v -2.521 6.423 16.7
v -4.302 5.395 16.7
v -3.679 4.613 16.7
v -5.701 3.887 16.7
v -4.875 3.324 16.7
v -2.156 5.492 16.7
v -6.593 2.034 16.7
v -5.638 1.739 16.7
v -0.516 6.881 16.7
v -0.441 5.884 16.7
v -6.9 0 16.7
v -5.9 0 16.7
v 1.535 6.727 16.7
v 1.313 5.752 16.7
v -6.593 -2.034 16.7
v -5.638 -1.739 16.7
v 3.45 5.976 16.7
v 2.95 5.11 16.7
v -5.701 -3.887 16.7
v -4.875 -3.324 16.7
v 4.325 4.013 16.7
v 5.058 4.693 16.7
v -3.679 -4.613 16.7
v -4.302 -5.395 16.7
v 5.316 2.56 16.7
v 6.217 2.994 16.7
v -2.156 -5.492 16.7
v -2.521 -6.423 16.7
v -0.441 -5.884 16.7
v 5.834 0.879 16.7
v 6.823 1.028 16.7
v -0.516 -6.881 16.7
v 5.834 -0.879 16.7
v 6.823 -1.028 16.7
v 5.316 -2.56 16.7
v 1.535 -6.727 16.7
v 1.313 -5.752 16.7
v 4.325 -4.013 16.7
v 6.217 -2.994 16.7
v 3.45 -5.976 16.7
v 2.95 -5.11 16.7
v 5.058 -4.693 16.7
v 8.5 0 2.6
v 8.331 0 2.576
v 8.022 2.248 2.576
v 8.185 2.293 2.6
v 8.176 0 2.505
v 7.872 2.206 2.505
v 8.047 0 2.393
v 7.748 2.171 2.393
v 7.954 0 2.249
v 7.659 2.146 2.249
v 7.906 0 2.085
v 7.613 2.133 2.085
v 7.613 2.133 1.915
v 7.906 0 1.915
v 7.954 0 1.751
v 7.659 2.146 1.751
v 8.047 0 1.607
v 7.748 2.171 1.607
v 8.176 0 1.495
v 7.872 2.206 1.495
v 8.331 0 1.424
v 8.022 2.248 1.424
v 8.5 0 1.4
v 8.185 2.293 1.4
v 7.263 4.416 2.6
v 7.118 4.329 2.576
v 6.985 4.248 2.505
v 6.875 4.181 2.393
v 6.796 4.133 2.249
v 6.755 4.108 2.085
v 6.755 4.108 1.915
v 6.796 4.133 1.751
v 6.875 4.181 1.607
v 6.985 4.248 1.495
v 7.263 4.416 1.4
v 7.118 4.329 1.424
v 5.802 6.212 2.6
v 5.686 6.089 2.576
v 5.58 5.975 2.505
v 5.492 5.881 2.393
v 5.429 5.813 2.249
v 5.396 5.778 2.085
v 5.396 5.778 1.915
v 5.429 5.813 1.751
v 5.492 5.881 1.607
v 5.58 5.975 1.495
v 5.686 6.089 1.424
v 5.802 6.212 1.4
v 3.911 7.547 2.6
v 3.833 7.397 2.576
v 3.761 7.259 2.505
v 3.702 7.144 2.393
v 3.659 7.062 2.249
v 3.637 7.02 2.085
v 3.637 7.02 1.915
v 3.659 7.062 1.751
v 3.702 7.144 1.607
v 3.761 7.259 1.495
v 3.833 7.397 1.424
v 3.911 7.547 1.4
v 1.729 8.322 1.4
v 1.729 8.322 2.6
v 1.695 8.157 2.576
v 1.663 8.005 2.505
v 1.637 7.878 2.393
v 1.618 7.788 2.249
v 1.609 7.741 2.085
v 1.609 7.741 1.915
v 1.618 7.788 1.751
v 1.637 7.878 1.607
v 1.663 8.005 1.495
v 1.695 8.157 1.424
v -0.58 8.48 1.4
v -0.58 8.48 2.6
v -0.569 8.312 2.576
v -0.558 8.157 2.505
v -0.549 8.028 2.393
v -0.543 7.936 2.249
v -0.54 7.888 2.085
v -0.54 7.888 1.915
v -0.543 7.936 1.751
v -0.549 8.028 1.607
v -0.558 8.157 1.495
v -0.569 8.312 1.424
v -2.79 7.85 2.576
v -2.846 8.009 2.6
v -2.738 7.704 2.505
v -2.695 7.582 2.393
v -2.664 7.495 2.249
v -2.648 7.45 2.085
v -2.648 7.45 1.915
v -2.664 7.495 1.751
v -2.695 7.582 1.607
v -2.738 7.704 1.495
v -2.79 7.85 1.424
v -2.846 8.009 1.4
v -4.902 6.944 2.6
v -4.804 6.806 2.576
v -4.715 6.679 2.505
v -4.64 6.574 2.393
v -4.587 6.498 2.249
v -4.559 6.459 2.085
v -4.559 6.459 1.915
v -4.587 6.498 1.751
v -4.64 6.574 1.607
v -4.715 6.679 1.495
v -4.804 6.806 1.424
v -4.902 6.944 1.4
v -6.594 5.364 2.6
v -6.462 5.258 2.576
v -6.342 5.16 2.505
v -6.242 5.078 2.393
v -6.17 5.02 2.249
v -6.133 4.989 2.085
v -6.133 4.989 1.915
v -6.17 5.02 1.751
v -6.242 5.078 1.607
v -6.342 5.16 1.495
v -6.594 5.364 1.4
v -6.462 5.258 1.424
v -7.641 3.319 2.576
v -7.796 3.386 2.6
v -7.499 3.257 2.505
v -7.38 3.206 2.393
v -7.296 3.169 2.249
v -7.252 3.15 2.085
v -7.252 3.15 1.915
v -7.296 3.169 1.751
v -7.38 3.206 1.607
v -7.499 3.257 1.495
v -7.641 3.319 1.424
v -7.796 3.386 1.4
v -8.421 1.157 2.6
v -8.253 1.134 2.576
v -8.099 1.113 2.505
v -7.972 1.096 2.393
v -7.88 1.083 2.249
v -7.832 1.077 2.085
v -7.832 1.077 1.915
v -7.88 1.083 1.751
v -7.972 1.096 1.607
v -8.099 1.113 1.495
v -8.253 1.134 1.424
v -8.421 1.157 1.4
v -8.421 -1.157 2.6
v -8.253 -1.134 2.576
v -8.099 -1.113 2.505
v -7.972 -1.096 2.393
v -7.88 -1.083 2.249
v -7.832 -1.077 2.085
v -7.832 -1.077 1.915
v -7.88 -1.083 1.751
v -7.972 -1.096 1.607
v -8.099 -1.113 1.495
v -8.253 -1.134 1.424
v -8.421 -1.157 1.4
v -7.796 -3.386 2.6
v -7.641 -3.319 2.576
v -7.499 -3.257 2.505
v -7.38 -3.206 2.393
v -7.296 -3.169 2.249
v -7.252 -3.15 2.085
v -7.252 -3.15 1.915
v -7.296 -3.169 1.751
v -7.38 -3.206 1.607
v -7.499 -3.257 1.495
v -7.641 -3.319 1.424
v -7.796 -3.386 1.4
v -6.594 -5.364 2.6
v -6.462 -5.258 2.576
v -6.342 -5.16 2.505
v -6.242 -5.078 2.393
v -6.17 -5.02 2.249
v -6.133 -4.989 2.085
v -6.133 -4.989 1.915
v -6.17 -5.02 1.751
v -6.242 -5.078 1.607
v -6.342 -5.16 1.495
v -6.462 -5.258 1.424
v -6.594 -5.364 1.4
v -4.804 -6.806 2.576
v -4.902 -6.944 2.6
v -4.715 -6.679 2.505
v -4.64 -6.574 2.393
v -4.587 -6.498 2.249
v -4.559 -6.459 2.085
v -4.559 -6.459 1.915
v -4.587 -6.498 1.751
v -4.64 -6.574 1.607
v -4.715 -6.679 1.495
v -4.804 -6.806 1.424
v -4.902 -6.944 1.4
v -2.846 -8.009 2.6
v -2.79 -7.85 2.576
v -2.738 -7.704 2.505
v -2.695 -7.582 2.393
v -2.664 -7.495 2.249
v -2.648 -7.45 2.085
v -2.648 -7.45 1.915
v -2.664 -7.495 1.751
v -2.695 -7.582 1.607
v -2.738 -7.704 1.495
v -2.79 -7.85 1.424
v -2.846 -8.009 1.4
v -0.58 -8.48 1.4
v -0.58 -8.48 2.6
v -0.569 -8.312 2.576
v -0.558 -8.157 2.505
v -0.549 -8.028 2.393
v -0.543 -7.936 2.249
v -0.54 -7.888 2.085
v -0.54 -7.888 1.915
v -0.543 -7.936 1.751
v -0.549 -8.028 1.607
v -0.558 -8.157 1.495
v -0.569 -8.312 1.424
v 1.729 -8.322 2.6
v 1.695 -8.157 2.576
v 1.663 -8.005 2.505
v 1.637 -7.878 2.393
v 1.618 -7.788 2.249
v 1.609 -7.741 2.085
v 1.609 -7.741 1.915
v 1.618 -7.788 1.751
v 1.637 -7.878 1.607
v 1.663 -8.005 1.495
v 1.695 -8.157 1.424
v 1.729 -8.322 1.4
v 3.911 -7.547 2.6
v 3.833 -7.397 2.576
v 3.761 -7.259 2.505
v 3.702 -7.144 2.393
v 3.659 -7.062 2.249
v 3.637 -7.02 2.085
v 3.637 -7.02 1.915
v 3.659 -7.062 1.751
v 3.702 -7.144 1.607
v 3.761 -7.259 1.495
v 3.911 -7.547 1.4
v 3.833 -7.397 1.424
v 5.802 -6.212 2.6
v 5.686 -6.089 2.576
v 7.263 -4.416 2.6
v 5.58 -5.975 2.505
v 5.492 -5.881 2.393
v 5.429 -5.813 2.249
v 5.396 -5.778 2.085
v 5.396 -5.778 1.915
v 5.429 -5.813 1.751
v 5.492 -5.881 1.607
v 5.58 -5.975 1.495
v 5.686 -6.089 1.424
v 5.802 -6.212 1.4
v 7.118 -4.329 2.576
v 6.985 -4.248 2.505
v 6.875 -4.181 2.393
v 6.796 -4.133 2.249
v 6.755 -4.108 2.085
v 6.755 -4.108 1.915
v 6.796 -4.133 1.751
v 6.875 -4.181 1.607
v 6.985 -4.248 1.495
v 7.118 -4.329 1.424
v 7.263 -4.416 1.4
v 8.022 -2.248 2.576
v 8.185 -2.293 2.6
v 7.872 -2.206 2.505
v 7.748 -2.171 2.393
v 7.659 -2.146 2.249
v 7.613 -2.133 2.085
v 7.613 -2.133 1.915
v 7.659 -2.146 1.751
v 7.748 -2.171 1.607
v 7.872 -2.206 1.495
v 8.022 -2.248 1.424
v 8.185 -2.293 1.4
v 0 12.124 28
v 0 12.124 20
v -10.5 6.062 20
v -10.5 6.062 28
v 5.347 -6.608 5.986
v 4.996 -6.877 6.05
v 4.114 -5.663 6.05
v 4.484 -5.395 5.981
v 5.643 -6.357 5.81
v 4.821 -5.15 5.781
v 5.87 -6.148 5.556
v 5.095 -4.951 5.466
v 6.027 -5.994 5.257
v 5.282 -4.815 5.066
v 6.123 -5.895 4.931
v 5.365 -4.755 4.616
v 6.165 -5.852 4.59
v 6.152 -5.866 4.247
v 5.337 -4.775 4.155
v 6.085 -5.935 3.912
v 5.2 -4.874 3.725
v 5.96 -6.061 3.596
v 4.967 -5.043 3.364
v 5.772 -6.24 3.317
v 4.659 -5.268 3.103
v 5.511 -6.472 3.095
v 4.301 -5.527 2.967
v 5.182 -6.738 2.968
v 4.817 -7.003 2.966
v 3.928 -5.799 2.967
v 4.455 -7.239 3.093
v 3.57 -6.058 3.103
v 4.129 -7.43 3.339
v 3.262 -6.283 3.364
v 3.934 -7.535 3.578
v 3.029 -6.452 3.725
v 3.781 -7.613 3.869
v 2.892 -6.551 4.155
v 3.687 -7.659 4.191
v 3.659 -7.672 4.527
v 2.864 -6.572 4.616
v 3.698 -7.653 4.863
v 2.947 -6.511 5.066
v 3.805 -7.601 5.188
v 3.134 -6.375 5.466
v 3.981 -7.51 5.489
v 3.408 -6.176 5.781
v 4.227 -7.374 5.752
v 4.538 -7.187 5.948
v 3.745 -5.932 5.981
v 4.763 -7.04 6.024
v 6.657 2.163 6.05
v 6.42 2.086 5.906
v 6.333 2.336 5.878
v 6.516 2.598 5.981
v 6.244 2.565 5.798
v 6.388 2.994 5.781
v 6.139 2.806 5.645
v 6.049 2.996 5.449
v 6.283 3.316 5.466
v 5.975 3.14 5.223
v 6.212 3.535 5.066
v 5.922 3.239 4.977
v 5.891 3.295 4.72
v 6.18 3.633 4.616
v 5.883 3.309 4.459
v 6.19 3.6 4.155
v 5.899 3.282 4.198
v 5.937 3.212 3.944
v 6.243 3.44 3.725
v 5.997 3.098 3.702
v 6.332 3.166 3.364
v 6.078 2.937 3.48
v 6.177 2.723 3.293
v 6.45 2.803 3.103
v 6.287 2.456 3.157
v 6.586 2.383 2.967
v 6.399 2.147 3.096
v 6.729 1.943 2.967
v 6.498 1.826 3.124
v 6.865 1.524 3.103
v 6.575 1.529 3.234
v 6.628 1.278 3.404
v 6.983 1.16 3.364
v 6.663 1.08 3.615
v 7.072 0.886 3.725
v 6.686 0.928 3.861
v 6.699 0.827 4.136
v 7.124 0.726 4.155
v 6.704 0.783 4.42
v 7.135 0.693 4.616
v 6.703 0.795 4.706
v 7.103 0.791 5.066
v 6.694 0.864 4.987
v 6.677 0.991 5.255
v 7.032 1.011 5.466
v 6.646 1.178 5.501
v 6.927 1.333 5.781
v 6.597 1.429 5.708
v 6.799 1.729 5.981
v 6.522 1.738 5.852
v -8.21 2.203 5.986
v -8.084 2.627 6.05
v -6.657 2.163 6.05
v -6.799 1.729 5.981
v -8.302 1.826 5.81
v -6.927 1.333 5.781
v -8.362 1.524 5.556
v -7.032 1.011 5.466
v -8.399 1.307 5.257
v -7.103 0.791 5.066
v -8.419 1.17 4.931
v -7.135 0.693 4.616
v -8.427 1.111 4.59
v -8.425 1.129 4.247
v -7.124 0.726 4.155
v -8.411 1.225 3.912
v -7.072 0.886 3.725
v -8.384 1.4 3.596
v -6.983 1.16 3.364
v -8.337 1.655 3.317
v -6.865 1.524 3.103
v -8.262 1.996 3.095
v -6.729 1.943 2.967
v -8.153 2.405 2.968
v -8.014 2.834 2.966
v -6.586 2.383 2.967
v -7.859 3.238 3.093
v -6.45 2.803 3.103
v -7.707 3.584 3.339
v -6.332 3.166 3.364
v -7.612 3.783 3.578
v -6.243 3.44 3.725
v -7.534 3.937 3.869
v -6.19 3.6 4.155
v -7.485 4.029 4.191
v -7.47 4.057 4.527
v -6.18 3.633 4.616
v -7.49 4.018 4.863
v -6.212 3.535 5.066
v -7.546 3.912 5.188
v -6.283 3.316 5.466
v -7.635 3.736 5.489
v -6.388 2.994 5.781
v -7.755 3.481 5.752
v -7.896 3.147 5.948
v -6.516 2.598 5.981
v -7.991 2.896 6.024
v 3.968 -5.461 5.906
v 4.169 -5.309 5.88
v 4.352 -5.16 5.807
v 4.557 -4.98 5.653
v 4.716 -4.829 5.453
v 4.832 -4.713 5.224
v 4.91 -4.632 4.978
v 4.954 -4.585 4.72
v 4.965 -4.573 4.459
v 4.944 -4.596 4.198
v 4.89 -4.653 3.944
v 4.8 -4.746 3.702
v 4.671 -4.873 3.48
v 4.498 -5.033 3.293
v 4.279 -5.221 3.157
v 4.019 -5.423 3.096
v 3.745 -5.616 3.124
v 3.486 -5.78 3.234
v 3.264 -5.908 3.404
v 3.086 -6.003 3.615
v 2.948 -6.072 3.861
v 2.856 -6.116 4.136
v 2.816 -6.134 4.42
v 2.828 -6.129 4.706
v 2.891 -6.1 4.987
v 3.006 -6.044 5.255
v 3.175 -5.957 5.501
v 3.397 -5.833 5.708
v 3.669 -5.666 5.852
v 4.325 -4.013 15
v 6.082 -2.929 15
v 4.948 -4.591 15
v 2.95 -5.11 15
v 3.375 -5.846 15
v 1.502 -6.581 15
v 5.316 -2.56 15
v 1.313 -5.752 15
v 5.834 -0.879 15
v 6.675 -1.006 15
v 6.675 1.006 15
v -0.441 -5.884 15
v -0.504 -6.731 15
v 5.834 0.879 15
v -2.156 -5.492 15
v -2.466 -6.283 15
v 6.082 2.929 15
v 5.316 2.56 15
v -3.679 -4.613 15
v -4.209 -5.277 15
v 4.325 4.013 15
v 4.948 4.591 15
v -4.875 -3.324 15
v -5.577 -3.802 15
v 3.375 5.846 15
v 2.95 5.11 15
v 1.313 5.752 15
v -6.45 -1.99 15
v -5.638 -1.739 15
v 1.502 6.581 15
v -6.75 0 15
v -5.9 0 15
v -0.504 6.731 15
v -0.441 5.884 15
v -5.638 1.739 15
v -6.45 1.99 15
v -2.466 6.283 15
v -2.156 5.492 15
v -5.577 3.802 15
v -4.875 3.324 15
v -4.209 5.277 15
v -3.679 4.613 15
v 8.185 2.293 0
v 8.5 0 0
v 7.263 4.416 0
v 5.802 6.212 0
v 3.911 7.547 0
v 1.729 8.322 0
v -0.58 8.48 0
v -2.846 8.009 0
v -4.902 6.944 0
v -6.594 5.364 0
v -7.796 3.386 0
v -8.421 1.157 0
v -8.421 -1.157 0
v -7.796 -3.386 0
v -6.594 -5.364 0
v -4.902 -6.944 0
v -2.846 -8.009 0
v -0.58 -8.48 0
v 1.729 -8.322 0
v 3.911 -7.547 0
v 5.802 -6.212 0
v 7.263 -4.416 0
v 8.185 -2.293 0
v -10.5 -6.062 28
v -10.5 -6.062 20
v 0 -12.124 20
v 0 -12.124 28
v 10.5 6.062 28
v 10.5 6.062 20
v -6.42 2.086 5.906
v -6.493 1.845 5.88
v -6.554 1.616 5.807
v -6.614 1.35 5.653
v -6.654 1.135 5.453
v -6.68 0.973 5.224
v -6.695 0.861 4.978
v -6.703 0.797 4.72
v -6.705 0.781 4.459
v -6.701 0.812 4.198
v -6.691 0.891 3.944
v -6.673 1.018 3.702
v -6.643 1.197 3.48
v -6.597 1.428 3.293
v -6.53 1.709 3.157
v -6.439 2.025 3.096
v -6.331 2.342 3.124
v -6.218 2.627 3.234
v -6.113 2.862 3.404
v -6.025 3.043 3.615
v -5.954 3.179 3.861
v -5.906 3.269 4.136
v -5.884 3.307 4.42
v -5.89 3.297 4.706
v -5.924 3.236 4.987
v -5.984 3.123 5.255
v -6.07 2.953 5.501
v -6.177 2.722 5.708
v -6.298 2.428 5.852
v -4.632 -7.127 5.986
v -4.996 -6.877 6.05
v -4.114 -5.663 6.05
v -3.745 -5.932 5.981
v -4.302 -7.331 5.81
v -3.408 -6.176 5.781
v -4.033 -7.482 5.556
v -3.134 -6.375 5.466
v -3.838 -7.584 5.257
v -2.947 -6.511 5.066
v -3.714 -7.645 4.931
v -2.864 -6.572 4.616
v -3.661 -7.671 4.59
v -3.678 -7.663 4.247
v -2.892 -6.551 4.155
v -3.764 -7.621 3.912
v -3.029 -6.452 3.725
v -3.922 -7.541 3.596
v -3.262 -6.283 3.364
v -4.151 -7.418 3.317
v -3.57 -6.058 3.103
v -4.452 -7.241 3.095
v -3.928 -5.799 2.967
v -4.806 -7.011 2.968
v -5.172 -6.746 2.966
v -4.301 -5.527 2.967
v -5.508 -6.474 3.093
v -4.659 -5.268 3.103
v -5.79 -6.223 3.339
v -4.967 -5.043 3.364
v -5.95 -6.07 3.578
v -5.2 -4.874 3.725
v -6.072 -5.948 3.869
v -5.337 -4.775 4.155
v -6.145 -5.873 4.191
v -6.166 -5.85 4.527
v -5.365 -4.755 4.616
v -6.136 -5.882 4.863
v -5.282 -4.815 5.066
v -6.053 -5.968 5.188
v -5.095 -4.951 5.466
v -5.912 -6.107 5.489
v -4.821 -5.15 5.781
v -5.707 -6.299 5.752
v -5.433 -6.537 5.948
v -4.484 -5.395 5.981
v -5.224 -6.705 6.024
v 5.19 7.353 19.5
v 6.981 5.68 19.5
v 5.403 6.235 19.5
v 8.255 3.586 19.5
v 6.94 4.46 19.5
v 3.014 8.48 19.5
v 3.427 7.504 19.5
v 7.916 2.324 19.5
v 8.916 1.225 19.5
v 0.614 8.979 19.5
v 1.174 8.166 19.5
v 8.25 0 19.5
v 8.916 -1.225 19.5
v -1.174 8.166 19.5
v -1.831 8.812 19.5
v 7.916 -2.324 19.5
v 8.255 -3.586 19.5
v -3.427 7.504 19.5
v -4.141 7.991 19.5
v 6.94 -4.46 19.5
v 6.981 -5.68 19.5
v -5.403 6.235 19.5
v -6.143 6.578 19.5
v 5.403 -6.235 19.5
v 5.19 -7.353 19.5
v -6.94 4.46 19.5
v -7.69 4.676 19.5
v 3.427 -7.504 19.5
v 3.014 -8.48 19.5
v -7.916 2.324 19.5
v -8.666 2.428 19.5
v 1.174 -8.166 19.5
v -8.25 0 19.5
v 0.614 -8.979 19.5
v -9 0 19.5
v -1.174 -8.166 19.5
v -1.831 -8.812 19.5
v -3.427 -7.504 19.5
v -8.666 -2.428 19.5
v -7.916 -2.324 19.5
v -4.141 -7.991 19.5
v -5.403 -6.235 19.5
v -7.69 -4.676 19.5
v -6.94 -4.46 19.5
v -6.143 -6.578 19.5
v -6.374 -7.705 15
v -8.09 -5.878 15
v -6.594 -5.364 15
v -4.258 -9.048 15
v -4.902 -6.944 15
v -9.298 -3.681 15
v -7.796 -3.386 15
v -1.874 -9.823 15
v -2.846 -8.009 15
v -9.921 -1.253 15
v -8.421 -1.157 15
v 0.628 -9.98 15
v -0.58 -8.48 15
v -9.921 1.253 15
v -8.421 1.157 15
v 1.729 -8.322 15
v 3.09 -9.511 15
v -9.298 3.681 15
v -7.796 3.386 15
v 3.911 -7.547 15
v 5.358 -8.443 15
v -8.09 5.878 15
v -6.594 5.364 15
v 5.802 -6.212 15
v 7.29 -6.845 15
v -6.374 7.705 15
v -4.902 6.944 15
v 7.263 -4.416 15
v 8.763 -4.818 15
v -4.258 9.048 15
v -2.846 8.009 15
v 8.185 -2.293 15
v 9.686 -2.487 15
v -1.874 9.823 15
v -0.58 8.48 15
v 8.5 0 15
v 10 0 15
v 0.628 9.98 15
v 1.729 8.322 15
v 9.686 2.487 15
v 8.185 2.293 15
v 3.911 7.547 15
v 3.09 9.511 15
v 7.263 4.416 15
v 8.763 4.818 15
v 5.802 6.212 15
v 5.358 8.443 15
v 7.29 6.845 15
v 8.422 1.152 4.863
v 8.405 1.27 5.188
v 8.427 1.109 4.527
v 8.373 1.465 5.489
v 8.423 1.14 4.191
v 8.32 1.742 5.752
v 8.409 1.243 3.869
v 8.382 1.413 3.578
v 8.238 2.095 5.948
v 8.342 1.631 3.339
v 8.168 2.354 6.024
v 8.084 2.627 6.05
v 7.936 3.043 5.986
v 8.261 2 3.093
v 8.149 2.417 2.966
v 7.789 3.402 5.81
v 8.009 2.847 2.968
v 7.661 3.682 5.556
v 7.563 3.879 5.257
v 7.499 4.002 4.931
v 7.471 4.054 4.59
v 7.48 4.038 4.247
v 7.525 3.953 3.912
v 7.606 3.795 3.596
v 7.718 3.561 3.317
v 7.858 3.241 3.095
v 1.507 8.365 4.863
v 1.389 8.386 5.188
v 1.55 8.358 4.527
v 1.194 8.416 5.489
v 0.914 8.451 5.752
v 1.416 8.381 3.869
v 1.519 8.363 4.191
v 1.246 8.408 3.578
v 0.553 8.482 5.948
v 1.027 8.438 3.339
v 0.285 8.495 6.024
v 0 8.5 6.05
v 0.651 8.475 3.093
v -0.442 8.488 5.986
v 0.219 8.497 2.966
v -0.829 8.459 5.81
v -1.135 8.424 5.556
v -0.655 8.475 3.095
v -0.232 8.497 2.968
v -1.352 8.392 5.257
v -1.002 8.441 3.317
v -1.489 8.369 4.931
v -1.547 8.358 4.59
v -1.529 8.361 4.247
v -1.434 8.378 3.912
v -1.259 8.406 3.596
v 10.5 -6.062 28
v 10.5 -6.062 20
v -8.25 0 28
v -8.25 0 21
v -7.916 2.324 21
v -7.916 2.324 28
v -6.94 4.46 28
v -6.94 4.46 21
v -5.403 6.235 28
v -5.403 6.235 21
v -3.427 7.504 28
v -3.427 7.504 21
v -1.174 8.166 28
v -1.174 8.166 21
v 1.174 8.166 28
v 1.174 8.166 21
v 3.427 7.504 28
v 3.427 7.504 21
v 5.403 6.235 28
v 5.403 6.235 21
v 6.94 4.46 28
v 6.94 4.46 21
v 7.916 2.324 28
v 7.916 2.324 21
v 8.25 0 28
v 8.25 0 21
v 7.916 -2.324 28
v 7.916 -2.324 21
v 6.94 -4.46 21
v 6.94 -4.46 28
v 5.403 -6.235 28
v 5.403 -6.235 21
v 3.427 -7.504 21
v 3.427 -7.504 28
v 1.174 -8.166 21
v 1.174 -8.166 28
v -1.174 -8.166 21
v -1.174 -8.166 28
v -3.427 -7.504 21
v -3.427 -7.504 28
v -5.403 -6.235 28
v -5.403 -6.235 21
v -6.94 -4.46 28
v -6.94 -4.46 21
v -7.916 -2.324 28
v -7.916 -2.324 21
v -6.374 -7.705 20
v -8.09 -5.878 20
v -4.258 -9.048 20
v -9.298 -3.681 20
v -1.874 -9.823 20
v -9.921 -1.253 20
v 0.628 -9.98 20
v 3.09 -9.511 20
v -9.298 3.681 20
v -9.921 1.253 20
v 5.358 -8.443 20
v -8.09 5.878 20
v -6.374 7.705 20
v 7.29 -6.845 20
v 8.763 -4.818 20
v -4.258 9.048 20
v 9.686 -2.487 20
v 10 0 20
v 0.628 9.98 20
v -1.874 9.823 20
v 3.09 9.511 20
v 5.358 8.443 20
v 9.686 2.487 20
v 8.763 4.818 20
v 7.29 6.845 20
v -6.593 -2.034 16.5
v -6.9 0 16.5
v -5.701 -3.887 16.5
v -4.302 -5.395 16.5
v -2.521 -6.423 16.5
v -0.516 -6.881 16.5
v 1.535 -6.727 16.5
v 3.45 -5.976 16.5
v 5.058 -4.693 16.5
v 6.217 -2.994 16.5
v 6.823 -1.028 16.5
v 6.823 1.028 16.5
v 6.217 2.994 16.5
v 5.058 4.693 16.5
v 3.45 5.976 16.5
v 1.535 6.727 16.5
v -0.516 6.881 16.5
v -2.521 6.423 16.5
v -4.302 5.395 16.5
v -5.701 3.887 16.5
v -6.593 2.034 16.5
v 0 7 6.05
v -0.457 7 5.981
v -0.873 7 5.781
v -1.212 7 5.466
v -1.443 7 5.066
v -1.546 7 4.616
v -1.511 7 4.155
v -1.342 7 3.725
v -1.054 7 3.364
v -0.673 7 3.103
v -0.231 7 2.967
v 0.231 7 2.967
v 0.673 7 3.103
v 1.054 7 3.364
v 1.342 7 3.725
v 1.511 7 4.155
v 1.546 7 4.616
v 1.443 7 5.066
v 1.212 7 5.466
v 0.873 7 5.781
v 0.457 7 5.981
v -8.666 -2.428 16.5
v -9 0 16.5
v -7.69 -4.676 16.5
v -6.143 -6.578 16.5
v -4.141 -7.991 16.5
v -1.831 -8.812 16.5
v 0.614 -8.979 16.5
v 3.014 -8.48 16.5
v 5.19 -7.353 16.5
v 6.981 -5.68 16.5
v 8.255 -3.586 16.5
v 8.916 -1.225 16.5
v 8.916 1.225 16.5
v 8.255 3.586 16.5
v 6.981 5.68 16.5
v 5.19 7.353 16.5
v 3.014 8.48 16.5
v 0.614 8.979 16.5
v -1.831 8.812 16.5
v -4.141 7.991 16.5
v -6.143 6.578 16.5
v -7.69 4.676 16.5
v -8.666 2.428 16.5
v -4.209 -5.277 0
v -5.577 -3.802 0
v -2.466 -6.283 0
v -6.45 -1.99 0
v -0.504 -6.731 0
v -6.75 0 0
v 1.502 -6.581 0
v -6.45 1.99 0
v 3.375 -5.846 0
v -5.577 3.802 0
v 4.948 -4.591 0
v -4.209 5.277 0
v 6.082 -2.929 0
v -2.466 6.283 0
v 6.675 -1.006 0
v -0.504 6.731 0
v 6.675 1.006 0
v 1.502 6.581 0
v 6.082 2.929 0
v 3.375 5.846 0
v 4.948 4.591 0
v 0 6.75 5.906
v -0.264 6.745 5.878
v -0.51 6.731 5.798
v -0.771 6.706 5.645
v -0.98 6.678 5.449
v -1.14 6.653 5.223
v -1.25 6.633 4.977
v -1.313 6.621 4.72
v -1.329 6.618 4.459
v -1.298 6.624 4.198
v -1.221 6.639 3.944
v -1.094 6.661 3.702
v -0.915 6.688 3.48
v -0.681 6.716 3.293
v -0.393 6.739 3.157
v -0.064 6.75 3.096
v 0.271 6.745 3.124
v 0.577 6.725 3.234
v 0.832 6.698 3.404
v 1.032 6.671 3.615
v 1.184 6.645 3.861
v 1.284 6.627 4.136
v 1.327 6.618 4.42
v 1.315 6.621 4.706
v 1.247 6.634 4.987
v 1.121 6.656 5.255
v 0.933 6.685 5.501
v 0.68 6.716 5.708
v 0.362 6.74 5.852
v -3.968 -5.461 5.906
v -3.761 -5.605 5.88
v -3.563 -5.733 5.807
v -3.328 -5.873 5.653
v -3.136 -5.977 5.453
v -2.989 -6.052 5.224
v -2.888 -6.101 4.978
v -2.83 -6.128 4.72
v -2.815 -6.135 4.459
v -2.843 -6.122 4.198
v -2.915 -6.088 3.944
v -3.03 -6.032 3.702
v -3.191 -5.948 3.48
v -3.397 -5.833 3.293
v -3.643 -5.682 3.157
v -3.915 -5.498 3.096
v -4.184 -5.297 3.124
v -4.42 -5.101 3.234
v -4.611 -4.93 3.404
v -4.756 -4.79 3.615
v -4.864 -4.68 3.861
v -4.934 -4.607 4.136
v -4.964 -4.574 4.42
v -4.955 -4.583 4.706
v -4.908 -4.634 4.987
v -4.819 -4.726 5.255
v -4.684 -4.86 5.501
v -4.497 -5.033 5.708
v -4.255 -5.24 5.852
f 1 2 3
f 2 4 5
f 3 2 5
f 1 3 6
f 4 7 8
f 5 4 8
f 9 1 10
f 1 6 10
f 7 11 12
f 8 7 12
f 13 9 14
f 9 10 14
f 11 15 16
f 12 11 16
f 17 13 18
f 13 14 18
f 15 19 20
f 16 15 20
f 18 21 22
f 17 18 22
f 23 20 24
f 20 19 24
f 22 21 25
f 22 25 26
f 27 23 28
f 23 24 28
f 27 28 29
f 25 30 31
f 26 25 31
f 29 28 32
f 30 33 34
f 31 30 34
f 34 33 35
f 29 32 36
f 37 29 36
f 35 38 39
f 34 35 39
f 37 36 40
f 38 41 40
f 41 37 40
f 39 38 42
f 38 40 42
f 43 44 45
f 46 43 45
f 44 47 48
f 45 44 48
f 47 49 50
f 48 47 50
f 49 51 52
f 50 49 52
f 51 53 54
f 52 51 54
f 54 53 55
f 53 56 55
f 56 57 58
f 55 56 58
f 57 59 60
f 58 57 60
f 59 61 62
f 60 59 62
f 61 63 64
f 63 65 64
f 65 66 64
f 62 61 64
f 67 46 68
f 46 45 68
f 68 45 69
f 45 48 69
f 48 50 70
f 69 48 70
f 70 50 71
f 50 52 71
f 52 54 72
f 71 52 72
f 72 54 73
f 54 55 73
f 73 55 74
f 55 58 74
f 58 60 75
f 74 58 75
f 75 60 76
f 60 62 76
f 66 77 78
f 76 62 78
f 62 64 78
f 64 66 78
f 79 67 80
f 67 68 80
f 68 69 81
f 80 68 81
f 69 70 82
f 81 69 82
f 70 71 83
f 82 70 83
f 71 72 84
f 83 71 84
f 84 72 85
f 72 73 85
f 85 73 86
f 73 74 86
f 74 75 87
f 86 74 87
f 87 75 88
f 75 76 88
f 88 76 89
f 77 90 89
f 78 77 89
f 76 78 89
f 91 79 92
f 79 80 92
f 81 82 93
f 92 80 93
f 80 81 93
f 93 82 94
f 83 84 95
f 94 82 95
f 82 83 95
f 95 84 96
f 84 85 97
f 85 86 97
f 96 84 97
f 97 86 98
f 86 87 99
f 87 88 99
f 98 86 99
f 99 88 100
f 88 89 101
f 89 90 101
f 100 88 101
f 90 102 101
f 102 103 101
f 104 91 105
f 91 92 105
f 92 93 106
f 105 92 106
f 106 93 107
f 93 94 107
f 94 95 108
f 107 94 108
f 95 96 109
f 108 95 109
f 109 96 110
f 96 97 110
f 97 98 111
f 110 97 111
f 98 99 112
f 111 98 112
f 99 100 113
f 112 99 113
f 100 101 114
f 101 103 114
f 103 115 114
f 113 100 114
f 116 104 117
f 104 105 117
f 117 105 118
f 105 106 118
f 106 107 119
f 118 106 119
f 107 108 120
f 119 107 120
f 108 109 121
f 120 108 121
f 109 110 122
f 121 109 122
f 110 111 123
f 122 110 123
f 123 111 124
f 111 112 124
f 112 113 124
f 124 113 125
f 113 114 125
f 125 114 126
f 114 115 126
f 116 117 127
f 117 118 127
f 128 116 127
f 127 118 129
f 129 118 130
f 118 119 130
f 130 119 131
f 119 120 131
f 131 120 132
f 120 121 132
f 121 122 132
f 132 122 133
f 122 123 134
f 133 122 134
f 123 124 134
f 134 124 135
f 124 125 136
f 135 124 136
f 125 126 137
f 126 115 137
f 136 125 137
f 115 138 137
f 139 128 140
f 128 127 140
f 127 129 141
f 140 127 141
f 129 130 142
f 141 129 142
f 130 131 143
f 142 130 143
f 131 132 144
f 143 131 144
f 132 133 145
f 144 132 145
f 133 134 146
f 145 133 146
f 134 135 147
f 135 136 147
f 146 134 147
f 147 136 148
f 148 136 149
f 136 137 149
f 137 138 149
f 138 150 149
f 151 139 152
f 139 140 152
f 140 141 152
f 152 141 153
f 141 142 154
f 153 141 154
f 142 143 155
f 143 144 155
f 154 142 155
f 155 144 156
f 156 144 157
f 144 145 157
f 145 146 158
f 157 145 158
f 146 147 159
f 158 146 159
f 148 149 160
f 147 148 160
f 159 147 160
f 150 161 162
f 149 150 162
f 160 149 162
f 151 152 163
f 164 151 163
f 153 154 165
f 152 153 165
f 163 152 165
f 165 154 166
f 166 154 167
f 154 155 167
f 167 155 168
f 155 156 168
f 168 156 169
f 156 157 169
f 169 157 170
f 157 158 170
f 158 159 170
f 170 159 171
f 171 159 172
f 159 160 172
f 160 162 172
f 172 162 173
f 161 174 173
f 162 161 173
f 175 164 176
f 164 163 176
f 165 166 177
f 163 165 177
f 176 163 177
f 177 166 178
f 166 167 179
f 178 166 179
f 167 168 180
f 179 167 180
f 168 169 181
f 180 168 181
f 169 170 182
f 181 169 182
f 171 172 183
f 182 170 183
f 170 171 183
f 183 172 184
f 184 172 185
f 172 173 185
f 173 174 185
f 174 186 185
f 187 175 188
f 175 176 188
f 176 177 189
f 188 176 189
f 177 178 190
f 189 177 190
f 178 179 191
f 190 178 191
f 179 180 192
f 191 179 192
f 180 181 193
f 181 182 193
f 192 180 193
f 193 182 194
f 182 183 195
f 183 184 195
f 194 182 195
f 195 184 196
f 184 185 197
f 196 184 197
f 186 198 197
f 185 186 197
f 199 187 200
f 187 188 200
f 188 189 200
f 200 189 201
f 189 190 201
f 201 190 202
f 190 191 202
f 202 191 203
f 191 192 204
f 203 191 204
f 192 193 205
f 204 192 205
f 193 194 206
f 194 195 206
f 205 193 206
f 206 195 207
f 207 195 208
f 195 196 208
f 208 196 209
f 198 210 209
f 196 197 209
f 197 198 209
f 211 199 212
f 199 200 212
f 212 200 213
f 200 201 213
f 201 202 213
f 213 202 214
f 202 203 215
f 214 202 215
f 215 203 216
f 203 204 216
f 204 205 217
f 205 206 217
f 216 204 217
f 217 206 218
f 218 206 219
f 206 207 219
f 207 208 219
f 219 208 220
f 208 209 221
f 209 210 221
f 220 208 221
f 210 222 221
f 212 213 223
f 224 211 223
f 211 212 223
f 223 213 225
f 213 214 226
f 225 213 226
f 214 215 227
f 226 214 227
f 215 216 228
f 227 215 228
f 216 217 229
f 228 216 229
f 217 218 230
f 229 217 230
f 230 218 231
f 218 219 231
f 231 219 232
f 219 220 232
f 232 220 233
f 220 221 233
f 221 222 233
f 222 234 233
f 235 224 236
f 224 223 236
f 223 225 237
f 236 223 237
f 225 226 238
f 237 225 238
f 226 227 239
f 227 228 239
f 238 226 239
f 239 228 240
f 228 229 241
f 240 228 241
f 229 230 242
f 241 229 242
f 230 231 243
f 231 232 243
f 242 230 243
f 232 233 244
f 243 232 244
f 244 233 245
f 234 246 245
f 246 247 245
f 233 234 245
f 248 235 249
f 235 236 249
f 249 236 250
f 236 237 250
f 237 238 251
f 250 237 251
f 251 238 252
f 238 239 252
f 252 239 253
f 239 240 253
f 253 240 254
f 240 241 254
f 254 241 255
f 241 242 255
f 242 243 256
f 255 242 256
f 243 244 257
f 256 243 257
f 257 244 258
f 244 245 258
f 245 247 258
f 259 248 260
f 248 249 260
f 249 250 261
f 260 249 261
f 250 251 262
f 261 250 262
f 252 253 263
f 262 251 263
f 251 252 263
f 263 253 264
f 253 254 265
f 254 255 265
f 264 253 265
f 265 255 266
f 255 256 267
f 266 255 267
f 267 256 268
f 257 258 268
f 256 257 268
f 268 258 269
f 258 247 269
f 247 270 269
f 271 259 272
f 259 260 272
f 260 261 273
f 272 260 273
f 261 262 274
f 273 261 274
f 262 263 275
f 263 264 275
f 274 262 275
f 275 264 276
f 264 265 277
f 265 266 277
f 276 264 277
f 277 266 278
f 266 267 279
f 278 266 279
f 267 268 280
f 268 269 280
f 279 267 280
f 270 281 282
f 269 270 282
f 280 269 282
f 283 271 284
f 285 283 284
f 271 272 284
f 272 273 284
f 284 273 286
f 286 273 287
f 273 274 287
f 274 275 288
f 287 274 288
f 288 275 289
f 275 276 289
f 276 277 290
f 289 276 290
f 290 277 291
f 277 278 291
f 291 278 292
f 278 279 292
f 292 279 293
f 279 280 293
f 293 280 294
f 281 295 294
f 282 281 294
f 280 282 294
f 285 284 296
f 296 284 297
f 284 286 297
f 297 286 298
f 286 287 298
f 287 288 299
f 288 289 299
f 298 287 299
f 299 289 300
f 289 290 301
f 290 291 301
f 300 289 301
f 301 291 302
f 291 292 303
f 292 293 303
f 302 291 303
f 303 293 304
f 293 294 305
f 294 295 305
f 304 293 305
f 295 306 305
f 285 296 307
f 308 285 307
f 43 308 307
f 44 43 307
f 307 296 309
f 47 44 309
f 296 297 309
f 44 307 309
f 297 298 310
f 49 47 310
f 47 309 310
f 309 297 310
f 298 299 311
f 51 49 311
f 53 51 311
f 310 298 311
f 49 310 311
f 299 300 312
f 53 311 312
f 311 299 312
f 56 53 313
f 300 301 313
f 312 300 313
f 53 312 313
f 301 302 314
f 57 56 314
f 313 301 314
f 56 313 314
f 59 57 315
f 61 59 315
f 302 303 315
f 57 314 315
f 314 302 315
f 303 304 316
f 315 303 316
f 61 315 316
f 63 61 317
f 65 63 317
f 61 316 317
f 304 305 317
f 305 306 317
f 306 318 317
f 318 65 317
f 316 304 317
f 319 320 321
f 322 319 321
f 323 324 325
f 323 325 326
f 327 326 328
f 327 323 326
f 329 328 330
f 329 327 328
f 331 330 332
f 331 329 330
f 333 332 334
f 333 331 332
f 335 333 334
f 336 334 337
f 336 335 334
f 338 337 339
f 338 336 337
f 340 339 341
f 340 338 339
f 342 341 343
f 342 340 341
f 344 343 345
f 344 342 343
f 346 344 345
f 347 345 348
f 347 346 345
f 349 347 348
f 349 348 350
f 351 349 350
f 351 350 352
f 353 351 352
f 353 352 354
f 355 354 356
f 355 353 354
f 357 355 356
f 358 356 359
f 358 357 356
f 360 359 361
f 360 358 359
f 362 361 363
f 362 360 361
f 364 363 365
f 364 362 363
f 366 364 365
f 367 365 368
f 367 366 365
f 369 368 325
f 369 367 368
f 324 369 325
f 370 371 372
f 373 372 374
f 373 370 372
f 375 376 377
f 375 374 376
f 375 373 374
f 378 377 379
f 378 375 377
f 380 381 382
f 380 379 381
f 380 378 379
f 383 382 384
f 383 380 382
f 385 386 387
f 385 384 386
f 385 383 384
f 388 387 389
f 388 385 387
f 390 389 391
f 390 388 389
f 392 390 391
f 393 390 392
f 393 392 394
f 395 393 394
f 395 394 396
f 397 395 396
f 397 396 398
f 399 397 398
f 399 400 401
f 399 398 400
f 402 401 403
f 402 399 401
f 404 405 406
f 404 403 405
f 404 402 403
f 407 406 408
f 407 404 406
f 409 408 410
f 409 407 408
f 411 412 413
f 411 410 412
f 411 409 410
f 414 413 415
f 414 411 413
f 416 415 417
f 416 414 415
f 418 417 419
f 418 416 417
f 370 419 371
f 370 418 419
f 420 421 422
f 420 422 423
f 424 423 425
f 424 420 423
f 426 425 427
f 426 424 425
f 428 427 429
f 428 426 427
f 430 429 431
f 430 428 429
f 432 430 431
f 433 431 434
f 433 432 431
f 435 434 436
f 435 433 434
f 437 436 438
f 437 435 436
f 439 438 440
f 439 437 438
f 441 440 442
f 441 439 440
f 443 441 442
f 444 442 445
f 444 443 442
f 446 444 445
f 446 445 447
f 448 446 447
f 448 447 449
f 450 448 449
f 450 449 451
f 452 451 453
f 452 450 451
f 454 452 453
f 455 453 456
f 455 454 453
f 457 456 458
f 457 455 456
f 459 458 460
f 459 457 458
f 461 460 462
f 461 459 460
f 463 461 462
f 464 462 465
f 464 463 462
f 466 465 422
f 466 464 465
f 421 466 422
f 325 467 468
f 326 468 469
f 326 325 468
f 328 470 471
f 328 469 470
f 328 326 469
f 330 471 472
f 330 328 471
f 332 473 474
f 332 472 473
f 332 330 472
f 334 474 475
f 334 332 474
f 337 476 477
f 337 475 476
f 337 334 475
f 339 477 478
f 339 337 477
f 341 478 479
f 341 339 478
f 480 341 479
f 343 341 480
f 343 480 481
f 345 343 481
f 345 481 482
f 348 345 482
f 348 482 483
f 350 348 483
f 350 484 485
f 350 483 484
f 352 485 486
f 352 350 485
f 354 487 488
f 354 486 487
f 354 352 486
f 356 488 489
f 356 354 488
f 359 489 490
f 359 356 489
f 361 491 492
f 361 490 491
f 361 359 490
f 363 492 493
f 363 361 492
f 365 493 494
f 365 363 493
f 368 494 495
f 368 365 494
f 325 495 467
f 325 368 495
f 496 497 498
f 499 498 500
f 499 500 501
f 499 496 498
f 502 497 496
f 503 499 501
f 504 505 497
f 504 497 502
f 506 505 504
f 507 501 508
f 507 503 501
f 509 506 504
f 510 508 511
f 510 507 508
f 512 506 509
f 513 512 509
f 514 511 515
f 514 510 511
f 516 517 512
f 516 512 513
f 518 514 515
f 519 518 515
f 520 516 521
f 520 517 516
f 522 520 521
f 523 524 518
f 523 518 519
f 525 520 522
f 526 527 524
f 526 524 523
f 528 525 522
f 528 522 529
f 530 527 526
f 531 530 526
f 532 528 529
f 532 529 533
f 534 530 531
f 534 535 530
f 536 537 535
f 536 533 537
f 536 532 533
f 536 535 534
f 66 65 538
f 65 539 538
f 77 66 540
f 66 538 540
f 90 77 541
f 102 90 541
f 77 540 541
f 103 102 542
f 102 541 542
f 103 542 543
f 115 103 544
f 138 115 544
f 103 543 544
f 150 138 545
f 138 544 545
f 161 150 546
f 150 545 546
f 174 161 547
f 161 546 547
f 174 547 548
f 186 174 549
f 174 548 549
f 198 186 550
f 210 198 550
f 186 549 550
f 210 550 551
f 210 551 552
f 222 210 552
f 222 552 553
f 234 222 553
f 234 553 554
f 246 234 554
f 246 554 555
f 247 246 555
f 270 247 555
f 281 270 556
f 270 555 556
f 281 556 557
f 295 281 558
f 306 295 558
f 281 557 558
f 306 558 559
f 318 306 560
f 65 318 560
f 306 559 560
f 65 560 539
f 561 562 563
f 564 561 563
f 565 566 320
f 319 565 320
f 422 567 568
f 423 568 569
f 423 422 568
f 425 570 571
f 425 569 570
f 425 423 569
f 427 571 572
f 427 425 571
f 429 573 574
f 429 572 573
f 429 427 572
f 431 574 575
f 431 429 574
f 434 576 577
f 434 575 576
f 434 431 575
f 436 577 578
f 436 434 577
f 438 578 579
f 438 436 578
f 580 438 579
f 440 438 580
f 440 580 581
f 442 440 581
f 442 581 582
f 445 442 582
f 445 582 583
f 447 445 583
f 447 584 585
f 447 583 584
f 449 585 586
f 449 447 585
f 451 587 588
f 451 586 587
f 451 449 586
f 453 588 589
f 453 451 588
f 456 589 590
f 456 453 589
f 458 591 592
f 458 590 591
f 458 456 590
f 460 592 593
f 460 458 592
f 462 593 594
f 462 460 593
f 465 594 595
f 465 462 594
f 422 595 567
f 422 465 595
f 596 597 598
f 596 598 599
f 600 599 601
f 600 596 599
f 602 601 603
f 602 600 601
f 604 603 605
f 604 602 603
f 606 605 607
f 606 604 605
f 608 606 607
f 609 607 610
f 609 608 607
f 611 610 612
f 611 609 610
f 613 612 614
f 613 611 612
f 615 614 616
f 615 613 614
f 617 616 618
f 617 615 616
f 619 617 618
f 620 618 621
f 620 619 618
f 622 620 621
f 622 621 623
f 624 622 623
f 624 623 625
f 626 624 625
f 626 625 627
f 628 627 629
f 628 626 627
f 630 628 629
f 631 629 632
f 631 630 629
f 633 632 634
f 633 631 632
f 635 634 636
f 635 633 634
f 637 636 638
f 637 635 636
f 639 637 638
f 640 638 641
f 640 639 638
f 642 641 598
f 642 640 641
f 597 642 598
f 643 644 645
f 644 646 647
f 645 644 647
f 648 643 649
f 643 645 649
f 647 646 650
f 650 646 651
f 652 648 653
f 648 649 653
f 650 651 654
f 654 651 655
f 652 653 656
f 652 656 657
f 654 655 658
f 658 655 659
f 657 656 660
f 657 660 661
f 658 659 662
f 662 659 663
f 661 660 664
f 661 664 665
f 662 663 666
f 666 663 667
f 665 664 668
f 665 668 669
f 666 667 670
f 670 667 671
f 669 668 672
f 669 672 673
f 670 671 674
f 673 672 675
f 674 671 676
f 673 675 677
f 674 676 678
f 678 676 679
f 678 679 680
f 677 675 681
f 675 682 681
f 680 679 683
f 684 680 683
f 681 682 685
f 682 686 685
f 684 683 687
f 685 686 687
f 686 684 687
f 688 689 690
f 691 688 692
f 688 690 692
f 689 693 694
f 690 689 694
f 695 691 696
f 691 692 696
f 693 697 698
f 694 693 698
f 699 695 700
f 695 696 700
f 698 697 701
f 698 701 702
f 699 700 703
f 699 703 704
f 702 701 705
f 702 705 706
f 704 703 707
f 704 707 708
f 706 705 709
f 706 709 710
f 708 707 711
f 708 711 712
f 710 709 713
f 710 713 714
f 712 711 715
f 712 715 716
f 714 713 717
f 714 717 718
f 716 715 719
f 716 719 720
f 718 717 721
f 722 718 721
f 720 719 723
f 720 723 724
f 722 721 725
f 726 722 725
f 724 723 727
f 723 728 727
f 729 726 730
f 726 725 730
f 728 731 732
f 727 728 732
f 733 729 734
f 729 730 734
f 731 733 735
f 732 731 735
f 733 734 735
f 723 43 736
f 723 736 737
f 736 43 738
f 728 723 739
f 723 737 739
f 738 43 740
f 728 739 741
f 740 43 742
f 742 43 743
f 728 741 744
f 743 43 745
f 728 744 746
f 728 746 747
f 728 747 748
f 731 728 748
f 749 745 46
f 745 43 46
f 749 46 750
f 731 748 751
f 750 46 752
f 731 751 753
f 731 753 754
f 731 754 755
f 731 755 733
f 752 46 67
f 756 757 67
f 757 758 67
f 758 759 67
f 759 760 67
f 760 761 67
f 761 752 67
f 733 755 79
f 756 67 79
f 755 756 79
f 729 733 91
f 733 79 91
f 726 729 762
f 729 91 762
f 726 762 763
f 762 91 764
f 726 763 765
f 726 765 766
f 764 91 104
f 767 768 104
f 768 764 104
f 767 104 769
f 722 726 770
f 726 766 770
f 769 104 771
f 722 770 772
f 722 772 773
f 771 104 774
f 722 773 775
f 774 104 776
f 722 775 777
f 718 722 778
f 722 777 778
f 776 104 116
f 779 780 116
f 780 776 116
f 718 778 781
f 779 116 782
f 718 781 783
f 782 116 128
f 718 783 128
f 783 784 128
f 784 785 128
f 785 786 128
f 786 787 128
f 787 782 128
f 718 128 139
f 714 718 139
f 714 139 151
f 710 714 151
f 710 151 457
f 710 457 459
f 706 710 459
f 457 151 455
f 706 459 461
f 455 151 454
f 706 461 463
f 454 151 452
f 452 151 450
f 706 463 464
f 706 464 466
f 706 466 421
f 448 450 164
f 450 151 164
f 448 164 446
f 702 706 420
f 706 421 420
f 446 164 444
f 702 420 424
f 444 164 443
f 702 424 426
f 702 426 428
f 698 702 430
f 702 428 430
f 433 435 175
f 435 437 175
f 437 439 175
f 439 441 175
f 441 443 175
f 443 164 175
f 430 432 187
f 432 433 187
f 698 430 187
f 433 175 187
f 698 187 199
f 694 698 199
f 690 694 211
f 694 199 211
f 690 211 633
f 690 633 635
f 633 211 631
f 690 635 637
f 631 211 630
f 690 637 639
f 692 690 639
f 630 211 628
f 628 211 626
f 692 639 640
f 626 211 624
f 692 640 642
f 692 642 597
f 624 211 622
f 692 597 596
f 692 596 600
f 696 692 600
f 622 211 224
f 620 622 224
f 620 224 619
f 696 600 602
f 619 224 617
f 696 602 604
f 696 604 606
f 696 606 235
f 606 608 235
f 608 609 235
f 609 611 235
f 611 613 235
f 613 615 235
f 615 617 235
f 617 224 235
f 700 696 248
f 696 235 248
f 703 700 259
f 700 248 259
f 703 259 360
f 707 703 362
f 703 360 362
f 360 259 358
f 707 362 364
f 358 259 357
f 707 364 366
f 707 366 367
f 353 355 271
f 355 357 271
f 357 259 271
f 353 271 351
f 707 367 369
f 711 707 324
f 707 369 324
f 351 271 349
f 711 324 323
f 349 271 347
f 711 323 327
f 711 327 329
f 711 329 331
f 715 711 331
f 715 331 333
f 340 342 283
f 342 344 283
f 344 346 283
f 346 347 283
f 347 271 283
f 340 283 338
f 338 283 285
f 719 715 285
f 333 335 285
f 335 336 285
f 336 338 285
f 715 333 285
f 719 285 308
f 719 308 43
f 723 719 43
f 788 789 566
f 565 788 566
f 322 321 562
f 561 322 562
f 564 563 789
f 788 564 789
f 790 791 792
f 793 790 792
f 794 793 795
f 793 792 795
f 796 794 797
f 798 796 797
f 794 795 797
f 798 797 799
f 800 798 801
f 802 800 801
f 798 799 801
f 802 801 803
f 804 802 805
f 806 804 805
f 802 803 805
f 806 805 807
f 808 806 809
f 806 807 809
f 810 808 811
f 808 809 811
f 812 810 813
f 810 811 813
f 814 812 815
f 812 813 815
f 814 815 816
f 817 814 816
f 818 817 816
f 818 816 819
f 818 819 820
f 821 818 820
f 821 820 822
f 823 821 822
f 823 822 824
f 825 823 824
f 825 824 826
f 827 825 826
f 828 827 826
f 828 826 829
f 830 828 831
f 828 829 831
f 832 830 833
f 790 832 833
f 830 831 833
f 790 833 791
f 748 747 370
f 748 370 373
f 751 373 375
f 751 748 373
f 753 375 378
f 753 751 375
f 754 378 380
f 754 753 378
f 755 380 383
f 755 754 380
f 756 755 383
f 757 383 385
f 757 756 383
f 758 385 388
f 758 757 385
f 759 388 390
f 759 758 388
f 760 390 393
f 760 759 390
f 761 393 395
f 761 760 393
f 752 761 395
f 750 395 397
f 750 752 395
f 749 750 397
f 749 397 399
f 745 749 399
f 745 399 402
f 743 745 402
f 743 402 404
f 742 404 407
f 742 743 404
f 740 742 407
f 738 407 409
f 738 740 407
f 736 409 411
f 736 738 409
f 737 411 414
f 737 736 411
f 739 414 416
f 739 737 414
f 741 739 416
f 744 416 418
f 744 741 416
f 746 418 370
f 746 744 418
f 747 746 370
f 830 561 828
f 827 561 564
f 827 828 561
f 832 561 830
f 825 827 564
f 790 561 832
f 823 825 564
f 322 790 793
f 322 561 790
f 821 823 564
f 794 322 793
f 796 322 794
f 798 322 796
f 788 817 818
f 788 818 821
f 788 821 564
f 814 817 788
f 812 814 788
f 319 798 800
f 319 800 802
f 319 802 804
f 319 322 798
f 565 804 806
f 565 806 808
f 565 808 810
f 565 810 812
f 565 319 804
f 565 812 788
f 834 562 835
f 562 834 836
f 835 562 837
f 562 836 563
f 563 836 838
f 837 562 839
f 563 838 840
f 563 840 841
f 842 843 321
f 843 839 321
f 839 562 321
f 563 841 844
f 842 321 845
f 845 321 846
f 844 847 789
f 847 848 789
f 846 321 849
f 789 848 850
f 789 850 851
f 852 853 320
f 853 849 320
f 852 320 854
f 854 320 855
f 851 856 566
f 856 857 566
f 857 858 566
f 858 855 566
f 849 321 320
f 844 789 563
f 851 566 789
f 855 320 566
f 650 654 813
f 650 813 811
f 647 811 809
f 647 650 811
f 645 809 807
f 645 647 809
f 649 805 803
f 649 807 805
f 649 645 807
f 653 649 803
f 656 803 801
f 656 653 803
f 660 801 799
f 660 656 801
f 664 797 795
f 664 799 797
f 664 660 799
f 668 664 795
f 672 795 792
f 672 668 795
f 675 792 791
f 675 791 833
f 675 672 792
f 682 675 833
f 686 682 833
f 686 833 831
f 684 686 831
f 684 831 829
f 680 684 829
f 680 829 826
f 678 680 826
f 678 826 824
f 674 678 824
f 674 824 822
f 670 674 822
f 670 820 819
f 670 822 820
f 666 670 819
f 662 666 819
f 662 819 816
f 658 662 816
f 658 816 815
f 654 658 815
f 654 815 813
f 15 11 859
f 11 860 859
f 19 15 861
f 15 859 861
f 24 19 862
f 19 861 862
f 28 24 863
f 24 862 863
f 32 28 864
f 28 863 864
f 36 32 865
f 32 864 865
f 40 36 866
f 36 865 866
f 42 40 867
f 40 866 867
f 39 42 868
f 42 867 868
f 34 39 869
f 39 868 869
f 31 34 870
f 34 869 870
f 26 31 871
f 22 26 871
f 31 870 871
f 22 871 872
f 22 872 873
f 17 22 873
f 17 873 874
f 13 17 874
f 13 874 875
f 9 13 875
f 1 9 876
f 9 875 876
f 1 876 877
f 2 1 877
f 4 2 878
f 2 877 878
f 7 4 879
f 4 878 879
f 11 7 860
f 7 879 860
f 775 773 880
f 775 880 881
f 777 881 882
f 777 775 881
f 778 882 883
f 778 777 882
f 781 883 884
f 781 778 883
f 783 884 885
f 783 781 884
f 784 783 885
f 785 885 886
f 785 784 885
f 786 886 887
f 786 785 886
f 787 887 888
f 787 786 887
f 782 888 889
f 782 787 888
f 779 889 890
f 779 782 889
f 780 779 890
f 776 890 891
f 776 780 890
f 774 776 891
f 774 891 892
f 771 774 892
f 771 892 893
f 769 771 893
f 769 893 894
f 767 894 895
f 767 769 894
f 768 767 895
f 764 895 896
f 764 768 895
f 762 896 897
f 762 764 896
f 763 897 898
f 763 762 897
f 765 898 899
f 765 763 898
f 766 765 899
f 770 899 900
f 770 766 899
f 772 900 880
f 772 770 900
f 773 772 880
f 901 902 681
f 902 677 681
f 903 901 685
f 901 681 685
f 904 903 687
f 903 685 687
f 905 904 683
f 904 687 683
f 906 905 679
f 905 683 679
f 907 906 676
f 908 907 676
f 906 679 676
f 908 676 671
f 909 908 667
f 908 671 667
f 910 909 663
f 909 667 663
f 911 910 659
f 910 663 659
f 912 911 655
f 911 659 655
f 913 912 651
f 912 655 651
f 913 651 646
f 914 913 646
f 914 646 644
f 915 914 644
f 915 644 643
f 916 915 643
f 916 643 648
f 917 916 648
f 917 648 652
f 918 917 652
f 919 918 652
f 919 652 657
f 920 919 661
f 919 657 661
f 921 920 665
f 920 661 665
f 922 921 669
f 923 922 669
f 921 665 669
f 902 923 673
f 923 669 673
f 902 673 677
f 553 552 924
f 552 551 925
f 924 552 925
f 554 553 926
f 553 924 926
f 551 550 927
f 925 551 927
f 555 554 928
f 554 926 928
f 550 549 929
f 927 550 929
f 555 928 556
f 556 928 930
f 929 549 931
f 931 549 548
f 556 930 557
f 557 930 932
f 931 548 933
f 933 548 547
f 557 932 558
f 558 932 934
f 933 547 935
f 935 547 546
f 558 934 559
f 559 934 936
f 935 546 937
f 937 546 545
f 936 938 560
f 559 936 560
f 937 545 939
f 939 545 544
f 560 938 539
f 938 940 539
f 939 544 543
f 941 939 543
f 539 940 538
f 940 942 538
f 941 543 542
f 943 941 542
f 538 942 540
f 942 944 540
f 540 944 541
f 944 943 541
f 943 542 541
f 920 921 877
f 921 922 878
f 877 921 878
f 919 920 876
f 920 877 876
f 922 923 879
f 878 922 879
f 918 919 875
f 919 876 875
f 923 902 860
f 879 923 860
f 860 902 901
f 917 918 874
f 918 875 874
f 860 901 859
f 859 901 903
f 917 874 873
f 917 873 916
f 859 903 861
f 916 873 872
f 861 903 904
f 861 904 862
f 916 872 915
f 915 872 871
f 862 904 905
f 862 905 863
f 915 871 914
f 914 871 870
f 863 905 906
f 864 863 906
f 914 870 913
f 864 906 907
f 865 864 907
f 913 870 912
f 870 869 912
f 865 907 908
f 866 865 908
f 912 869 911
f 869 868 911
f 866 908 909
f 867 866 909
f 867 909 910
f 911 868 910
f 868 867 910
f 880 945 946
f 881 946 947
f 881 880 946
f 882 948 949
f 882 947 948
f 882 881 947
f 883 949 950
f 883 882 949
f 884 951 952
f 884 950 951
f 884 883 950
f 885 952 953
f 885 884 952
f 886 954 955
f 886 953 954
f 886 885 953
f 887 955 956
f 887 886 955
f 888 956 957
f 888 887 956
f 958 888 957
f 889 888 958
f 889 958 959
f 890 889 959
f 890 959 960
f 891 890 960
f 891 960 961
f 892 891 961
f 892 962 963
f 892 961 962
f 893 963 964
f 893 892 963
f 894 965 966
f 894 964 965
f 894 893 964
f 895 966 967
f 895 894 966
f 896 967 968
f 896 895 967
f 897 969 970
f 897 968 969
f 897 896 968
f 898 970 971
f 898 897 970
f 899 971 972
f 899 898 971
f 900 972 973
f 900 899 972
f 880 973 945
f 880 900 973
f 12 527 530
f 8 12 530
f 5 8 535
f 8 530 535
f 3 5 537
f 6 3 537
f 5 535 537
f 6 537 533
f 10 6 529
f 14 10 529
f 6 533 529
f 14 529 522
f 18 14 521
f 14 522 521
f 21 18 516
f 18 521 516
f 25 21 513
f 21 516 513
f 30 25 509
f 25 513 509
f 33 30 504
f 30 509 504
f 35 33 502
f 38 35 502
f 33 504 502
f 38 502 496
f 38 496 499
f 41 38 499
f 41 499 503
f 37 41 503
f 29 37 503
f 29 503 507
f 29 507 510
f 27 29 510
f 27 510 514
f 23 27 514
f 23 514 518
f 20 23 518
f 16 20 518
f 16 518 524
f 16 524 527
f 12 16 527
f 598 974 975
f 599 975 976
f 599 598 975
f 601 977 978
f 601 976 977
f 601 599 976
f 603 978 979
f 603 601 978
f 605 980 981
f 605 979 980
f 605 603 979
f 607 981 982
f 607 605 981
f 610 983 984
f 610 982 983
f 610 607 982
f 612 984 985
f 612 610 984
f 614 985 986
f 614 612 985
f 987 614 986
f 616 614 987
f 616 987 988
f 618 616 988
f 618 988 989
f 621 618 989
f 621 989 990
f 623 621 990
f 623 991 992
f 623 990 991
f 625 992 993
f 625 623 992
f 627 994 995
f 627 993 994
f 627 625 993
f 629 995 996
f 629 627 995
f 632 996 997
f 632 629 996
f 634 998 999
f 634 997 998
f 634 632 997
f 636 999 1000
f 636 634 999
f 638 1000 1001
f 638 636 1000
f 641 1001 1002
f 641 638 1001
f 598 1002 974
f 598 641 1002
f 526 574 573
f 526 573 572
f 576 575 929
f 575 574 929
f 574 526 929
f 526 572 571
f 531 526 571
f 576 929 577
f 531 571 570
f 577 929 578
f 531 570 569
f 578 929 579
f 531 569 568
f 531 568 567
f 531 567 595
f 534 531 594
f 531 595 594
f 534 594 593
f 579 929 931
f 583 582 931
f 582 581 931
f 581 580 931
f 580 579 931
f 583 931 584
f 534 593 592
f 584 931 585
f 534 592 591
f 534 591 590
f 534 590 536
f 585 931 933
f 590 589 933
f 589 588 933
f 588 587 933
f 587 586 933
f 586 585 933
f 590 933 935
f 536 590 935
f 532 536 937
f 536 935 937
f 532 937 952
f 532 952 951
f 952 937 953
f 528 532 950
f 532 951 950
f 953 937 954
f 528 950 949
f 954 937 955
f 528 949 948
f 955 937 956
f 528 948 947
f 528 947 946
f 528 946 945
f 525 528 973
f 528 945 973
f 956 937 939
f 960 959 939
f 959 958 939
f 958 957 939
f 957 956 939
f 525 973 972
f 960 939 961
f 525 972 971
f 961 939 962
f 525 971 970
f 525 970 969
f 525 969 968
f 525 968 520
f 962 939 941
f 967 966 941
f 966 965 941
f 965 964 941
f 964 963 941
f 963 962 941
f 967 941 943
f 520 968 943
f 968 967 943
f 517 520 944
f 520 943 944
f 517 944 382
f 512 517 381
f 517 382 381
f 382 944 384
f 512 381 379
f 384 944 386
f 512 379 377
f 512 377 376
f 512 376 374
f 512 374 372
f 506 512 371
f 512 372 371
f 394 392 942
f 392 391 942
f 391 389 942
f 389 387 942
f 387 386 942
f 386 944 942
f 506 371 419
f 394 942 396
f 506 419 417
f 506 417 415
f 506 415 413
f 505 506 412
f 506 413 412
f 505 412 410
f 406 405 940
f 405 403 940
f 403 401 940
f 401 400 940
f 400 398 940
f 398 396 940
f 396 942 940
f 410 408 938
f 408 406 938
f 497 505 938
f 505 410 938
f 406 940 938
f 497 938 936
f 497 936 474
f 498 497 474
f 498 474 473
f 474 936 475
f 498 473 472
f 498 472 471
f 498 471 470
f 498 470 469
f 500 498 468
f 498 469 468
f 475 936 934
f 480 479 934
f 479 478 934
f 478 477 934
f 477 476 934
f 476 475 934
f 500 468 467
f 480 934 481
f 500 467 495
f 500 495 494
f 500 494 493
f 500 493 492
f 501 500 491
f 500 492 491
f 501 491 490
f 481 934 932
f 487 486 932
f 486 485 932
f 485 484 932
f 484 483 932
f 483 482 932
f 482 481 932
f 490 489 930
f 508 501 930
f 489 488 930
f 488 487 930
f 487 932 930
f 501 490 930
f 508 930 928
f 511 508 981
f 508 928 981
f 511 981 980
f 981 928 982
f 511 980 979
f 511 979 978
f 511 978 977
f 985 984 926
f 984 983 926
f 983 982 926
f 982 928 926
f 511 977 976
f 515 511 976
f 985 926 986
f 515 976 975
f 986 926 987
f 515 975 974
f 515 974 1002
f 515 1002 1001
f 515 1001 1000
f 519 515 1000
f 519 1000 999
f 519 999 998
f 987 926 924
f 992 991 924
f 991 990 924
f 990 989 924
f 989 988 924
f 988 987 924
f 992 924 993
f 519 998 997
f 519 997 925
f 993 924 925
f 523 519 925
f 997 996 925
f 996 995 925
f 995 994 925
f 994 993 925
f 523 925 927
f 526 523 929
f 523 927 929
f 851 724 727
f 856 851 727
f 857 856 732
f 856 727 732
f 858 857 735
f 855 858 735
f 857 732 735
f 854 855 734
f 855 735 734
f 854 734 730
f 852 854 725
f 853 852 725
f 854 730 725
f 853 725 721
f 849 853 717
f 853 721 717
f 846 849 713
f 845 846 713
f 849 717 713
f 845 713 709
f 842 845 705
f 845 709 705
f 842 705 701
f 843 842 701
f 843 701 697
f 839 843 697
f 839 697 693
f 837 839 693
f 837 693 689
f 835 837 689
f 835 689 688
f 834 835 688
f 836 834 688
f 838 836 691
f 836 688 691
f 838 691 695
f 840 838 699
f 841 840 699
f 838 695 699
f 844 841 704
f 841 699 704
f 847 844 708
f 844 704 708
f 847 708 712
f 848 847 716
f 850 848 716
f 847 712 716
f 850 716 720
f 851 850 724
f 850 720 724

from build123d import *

# Parameters (mm, degrees)
SKETCH_2_R               = 8.5
EXTRUDE_1_DEPTH          = 15
SKETCH_3_R               = 10
EXTRUDE_2_DEPTH          = 5
EXTRUDE_3_DEPTH          = 8
SKETCH_6_R               = 6.75
CUT_EXTRUDE_1_DEPTH      = 15
SKETCH_7_R               = 5.9
CUT_EXTRUDE_2_DEPTH      = 22.960191256
M18X1_5_1_D              = 16.5
M18X1_5_1_DEPTH          = 7
M18X1_5_1_TIP            = 4.957100107
CUT_EXTRUDE_START        = 19.5
SKETCH_13_R              = 8.25
CUT_EXTRUDE_3_DEPTH      = 1.5
SWEEP_1_PROFILE_R        = 0.6
PATTERN_CIRCULAR_1_COUNT = 5


with BuildPart() as part:
    # 草图2 → 凸台-拉伸1 (new body)
    with BuildSketch(Plane.XY):
        Circle(SKETCH_2_R)
    extrude(amount=EXTRUDE_1_DEPTH)

    # 草图3 → 凸台-拉伸2 (add)
    with BuildSketch(Plane.XY.offset(15)):
        Circle(SKETCH_3_R)
    extrude(amount=EXTRUDE_2_DEPTH)

    # 草图4 → 凸台-拉伸3 (add)
    with BuildSketch(Plane.XY.offset(20)):
        Polygon((0, 12.124355653), (-10.5, 6.062177826), (-10.5, -6.062177826), (0, -12.124355653), (10.5, -6.062177826), (10.5, 6.062177826), align=None)
    extrude(amount=EXTRUDE_3_DEPTH)

    # 草图6 → 切除-拉伸1 (cut)
    with BuildSketch(Plane(origin=(0, 0, 0), x_dir=(-1, 0, 0), z_dir=(0, 0, -1))):
        Circle(SKETCH_6_R)
    extrude(amount=-CUT_EXTRUDE_1_DEPTH, mode=Mode.SUBTRACT)

    # 草图7 → 切除-拉伸2 (cut, through all)
    with BuildSketch(Plane(origin=(0, 0, 15), x_dir=(-1, 0, 0), z_dir=(0, 0, -1))):
        Circle(SKETCH_7_R)
    extrude(amount=-CUT_EXTRUDE_2_DEPTH, mode=Mode.SUBTRACT)

    # 草图8 → 切除-旋转1 (revolve, cut)
    with BuildSketch(Plane(origin=(0, 0, 0), x_dir=(0, 0, -1), z_dir=(1, 0, 0)), mode=Mode.PRIVATE) as cut_revolve_1_sk:
        Polygon((-16.7, 0), (-16.7, -6.9), (-16.5, -6.9), (-16.5, -9), (-19.5, -9), (-19.5, 0), align=None)
    revolve(cut_revolve_1_sk.sketch.rotate(Axis((0, 0, 5.279548329), (0, 0, 1)), 270), axis=Axis((0, 0, 5.279548329), (0, 0, 1)), mode=Mode.SUBTRACT)

    # M18x1.5 螺纹孔1
    with Locations(Plane.XY.offset(28)):
        with Locations((0, 0)):
            Hole(M18X1_5_1_D / 2, depth=M18X1_5_1_DEPTH)
            with Locations((0, 0, -(M18X1_5_1_DEPTH + M18X1_5_1_TIP / 2))):  # 118° drill point
                Cone(0, M18X1_5_1_D / 2, M18X1_5_1_TIP, mode=Mode.SUBTRACT)

    # 草图13 → 切除-拉伸3 (cut)
    with BuildSketch(Plane.XY.offset(CUT_EXTRUDE_START)):
        Circle(SKETCH_13_R)
    extrude(amount=CUT_EXTRUDE_3_DEPTH, mode=Mode.SUBTRACT)

    # 切除-扫描1: sweep along a path in 草图14
    with BuildLine(Plane.XY.offset(2)) as sweep_1_path:
        CenterArc((0, 0), 8.5, 0, 360)
    # 切除-扫描1 profile (on start of the path) → 切除-扫描1 (sweep, cut)
    with BuildSketch(Plane(origin=(8.5, 0, 2), x_dir=(0, 0, 1), z_dir=(0, 1, 0))):
        Circle(SWEEP_1_PROFILE_R)
    sweep(path=sweep_1_path.line, mode=Mode.SUBTRACT)

    # 草图22 → Ø3.1 (3.1) 直径孔1 (revolve, cut)
    with BuildSketch(Plane(origin=(0, 8.5, 4.5), x_dir=(0, 0, 1), z_dir=(1, 0, 0))):
        Polygon((0, 0), (0, 4.184678752), (1.55, 1.5), (1.55, 0), align=None)
    hole_wizard_3_1_3_1_1 = revolve(axis=Axis((0, 14.85, 4.5), (0, -1, 0)), mode=Mode.SUBTRACT)

    # 阵列(圆周)1: Ø3.1 (3.1) 直径孔1 ×5 about axis
    pattern_circular_1_axis = Axis((0, 0, 0), (0, 0, 1))
    for i in range(1, PATTERN_CIRCULAR_1_COUNT):
        add(hole_wizard_3_1_3_1_1.rotate(pattern_circular_1_axis, i * 360 / PATTERN_CIRCULAR_1_COUNT), mode=Mode.SUBTRACT)


solid = part.part
